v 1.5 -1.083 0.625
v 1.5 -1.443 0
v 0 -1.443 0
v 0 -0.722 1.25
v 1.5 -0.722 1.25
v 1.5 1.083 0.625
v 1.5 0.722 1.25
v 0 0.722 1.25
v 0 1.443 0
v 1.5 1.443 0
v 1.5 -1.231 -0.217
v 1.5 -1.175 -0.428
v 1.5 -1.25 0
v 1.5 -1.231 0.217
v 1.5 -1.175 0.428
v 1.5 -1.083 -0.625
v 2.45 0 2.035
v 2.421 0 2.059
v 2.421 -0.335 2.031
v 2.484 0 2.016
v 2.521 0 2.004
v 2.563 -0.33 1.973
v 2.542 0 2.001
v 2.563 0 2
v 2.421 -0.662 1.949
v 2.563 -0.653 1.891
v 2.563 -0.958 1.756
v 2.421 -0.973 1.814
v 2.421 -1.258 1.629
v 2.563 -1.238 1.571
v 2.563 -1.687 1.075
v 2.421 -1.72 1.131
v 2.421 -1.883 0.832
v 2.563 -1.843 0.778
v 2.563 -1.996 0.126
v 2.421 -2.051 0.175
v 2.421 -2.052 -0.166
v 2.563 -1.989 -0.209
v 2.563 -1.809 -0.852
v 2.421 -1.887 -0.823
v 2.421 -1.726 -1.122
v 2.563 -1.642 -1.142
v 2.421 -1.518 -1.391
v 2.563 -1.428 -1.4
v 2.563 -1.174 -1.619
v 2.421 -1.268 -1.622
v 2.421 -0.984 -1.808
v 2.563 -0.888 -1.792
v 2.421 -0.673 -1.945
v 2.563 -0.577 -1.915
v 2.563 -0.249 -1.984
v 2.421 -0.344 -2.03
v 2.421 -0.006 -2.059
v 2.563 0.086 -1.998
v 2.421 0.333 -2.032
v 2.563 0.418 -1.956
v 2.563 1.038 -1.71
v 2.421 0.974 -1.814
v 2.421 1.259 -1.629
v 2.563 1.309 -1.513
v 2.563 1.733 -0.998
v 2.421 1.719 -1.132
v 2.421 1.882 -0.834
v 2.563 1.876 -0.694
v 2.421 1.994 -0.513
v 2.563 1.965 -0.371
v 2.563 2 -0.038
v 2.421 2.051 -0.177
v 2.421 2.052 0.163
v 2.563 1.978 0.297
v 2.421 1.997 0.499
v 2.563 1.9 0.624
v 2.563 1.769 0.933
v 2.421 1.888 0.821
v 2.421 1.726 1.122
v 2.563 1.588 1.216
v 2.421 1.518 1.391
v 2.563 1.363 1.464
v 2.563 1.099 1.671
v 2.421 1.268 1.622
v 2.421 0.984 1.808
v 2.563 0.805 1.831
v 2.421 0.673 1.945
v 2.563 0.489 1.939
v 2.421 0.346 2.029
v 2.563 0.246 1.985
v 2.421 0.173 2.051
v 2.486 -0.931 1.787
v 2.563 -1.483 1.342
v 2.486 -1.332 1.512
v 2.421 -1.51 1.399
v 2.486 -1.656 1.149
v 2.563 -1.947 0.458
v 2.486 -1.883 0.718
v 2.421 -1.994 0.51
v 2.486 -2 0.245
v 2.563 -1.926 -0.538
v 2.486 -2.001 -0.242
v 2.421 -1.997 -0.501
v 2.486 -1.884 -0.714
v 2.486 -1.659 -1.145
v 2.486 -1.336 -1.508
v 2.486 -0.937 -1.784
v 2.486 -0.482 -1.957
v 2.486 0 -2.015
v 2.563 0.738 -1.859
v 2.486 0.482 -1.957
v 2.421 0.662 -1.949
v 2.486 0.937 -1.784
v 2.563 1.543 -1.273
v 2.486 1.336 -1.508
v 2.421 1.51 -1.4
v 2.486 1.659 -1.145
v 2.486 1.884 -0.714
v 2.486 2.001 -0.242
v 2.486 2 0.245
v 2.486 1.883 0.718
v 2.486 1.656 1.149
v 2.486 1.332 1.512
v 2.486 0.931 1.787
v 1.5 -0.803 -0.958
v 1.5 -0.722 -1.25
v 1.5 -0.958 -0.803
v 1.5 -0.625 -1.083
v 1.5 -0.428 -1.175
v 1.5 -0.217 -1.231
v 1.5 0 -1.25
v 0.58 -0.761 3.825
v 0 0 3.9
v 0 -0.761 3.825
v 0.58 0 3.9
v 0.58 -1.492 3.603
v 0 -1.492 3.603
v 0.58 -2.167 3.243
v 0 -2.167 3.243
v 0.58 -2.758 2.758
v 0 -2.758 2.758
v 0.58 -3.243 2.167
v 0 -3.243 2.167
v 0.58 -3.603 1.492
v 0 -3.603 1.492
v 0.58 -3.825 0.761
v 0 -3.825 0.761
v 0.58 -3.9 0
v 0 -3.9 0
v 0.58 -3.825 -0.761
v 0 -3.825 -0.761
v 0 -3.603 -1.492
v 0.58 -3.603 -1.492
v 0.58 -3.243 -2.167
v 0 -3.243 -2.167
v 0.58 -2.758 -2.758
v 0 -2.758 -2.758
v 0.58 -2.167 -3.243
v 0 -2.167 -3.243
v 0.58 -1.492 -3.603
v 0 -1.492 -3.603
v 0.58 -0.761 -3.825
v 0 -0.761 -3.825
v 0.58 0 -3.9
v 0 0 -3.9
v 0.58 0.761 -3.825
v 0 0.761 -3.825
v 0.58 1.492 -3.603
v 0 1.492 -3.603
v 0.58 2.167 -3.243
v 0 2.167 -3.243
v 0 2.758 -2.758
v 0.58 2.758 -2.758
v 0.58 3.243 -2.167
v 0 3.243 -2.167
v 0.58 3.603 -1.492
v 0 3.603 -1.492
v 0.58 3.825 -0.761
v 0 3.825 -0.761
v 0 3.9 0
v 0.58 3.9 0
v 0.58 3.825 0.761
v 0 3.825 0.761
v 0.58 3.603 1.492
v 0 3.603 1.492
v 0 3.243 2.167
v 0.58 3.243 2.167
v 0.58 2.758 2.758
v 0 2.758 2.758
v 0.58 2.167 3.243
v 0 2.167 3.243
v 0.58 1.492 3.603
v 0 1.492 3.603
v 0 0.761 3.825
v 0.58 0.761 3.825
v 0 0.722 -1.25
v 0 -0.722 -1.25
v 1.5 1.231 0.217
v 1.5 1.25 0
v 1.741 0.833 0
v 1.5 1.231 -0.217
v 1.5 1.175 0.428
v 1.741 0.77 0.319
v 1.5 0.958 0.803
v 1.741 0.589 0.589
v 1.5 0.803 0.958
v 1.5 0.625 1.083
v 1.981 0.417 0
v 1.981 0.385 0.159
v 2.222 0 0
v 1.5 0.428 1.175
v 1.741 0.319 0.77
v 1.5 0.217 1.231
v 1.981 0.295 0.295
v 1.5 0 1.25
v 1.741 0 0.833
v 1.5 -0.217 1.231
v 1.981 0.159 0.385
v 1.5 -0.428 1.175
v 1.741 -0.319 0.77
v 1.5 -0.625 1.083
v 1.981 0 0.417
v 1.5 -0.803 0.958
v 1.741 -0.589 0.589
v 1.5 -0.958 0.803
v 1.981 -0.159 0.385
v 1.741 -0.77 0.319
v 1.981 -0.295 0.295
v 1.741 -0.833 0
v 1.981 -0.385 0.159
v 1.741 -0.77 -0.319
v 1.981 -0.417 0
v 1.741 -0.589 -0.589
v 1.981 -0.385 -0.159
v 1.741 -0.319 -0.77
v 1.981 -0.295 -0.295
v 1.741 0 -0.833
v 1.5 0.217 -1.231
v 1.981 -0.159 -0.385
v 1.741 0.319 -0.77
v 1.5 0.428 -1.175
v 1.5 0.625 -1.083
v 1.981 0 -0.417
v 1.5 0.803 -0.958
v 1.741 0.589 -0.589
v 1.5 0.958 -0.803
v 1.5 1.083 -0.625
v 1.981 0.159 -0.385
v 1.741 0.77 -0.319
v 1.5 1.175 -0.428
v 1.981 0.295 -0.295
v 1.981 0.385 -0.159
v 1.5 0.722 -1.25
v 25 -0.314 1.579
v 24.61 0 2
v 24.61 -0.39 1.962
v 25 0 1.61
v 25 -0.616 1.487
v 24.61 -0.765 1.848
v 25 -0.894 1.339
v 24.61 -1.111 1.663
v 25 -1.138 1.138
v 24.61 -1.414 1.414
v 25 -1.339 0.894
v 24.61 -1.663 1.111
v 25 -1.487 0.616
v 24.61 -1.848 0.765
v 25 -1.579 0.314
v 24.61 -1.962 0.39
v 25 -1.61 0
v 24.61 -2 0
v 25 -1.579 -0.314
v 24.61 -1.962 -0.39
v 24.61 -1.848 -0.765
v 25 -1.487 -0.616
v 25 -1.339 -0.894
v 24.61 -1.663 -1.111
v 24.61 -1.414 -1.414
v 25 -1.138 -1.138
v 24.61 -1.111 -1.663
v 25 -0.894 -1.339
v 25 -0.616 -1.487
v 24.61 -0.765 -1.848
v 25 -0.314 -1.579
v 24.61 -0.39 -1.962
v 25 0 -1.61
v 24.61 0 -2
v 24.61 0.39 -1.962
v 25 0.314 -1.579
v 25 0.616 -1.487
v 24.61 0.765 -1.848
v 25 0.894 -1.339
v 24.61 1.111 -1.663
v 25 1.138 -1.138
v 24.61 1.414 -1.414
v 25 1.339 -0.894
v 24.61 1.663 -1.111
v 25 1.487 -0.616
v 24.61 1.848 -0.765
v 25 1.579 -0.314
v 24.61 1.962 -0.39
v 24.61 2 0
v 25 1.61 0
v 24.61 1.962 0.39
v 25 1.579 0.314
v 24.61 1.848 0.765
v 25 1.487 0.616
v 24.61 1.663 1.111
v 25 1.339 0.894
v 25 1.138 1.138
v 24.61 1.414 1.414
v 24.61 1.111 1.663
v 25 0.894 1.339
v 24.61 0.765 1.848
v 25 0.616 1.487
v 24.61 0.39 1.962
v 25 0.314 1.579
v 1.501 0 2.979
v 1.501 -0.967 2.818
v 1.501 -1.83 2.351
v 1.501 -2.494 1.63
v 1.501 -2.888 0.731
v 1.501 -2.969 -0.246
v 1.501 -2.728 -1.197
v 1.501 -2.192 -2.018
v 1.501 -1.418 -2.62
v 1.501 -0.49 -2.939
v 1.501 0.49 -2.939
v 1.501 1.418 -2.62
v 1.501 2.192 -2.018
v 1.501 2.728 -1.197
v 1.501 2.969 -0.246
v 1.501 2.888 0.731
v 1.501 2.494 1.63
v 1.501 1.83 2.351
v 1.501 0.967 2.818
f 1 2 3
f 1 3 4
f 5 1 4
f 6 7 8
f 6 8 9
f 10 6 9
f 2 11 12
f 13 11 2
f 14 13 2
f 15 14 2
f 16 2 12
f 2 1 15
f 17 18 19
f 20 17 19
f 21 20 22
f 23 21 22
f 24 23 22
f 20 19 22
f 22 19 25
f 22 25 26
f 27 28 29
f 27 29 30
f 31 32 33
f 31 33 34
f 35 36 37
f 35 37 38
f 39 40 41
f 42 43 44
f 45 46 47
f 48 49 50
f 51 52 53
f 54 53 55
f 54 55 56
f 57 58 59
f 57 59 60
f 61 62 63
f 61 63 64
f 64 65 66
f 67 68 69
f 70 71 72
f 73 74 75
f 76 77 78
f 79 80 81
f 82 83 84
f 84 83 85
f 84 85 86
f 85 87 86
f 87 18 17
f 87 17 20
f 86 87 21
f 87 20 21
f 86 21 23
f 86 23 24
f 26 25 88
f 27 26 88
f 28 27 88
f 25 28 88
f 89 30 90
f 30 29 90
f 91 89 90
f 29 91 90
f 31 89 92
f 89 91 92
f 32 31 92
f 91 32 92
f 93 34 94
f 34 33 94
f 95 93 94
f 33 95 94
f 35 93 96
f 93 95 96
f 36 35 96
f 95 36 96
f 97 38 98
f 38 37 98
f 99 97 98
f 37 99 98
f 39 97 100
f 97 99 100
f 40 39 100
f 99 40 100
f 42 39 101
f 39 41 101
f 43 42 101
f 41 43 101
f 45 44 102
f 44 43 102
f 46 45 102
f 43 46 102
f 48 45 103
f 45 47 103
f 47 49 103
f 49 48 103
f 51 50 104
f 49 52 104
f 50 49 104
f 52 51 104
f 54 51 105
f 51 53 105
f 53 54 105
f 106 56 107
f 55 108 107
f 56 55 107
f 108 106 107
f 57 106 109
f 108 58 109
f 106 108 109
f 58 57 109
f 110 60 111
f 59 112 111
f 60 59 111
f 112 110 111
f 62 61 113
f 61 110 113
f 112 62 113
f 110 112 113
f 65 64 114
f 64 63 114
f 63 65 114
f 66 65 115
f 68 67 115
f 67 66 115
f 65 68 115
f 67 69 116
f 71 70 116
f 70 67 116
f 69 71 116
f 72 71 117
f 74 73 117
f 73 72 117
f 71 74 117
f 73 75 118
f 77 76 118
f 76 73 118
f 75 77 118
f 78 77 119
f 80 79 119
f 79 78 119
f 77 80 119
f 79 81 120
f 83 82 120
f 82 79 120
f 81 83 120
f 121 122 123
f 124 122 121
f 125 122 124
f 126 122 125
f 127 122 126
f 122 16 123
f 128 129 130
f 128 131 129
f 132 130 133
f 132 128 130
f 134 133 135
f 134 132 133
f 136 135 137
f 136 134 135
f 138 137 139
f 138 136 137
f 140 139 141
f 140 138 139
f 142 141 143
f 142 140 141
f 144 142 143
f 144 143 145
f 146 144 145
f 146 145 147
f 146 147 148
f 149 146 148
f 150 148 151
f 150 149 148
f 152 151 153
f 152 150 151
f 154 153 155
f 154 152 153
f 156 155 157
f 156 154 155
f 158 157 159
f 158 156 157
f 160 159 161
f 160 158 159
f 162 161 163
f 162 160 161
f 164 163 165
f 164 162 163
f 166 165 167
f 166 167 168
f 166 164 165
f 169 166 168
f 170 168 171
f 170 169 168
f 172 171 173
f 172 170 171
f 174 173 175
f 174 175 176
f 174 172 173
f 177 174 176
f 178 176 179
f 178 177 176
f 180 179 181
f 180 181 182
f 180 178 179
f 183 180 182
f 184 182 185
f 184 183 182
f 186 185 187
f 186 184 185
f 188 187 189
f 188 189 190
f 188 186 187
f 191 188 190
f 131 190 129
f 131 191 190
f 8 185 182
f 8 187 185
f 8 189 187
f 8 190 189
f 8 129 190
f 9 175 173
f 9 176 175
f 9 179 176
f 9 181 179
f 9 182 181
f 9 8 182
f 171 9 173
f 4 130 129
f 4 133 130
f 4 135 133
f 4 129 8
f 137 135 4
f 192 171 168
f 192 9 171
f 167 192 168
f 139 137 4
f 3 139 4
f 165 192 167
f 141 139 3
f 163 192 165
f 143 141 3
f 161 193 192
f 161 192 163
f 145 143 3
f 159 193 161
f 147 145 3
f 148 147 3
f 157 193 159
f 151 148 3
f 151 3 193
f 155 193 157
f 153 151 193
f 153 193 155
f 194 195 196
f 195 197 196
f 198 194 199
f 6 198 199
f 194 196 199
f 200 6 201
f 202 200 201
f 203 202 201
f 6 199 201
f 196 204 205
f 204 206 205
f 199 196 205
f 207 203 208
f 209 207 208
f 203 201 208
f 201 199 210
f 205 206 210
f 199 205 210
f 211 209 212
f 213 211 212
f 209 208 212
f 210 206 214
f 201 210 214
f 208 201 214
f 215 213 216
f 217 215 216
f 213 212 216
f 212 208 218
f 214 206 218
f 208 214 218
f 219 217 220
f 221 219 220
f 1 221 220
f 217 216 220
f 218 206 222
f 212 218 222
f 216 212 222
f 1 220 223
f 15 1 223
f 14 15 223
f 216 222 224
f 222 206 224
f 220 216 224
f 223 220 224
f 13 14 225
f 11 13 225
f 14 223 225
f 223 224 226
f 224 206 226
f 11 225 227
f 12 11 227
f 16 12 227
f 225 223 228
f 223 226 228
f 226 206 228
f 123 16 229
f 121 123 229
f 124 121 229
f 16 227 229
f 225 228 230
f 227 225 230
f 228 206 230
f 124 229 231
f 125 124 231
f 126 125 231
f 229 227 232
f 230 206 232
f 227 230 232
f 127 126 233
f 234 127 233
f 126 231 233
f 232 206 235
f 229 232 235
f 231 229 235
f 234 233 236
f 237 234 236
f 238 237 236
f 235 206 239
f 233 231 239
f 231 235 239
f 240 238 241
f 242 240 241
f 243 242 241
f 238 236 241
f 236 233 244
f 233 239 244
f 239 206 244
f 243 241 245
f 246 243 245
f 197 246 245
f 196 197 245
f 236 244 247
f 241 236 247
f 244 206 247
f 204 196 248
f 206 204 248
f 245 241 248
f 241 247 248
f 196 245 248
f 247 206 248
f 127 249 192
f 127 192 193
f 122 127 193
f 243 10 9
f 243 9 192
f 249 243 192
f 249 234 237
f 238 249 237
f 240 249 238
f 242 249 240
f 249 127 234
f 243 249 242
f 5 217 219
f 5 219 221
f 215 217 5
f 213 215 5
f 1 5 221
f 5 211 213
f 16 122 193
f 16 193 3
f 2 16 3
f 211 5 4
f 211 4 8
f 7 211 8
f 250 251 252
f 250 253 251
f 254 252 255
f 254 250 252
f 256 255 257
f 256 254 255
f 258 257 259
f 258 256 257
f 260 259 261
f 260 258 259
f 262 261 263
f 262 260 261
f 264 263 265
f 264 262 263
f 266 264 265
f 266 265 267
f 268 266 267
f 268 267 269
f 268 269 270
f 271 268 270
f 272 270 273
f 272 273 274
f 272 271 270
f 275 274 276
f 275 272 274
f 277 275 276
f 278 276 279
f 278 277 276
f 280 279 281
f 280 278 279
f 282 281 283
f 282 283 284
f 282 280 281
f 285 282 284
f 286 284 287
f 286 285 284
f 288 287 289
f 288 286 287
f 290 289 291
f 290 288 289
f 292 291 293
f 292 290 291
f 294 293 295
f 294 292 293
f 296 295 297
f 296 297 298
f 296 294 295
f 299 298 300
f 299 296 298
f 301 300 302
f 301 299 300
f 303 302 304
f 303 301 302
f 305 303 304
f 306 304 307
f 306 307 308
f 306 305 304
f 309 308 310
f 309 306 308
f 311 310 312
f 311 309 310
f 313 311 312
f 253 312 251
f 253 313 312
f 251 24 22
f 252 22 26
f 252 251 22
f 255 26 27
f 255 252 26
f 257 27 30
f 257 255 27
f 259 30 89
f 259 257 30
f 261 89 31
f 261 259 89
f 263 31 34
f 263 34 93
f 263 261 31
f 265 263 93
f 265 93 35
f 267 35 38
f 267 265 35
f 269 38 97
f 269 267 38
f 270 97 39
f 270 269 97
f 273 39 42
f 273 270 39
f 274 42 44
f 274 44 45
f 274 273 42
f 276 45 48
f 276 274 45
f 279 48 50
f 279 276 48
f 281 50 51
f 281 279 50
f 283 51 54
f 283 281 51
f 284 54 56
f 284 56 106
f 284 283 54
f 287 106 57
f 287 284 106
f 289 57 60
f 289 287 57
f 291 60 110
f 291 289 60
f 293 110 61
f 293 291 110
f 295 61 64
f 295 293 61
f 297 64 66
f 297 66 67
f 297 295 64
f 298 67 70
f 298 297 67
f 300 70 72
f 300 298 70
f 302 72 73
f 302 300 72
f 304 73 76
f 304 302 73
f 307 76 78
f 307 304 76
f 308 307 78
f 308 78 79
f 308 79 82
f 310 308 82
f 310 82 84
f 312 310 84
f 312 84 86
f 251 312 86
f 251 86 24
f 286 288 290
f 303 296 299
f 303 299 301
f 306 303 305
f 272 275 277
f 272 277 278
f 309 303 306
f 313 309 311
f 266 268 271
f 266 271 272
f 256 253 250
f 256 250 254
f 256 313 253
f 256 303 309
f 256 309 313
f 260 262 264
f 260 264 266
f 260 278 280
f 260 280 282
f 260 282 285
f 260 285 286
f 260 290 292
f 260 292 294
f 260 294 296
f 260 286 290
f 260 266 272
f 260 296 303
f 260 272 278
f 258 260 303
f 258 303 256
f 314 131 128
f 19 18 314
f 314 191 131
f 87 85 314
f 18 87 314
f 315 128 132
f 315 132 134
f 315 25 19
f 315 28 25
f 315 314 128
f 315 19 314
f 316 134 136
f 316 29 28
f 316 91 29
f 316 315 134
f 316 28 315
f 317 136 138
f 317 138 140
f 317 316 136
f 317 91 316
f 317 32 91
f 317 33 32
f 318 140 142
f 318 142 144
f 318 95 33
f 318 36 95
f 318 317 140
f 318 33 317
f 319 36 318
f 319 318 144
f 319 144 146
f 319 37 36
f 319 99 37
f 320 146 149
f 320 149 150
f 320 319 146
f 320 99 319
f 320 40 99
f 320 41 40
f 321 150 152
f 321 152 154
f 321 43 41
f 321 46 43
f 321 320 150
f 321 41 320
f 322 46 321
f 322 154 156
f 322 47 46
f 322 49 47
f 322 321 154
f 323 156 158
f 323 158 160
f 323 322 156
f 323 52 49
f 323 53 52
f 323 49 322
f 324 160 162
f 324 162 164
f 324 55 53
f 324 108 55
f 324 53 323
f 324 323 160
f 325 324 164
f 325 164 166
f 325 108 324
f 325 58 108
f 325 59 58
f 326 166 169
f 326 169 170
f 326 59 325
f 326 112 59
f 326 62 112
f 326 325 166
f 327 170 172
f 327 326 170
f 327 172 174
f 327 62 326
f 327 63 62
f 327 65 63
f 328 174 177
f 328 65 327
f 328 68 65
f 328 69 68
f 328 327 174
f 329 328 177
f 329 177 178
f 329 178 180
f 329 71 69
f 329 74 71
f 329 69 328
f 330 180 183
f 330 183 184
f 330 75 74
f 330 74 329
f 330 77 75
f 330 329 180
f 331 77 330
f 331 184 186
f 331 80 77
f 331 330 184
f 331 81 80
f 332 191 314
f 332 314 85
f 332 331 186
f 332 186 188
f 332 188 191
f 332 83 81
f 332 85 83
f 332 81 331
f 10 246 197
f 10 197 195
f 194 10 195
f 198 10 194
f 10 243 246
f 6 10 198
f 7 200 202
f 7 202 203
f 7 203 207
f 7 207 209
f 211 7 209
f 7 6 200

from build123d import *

# Parameters (mm, degrees)
FILLET1_R   = 0.2
HEX_START   = -1.5
HEX_2_DEPTH = 1.5


with BuildPart() as part:
    # BodySke → BaseBody (revolve)
    with BuildSketch(Plane.XY, mode=Mode.PRIVATE) as basebody_sk:
        Polygon((0, 0), (0, 3.9), (0.58, 3.9), (2.48, 2), (24.61, 2), (25, 1.61), (25, 0), align=None)
    revolve(basebody_sk.sketch.rotate(Axis((0, 0, 0), (1, 0, 0)), 90), axis=Axis((0, 0, 0), (1, 0, 0)))

    # Fillet1
    fillet1_edges = [part.edges().sort_by_distance(p)[0] for p in [
        (2.48, 0, -2),
    ]]
    fillet(fillet1_edges, radius=FILLET1_R)

    # Hex 2: read off the stored shape, not the designer's step
    # Hex 2 outline → Hex 2 (cut)
    with BuildSketch(Plane.ZY.offset(HEX_START)):
        Polygon((-1.25, -0.721687836), (0, -1.443375673), (1.25, -0.721687836), (1.25, 0.721687836), (0, 1.443375673), (-1.25, 0.721687836), align=None)
    extrude(amount=HEX_2_DEPTH, mode=Mode.SUBTRACT)

    # Hex 2 2 outline → Hex 2 2 (revolve, cut)
    with BuildSketch(Plane.YX):
        Polygon((1.25, 1.5), (0, 2.221687836), (0, 1.5), align=None)
    revolve(axis=Axis((0, 0, 0), (1, 0, 0)), mode=Mode.SUBTRACT)


solid = part.part
